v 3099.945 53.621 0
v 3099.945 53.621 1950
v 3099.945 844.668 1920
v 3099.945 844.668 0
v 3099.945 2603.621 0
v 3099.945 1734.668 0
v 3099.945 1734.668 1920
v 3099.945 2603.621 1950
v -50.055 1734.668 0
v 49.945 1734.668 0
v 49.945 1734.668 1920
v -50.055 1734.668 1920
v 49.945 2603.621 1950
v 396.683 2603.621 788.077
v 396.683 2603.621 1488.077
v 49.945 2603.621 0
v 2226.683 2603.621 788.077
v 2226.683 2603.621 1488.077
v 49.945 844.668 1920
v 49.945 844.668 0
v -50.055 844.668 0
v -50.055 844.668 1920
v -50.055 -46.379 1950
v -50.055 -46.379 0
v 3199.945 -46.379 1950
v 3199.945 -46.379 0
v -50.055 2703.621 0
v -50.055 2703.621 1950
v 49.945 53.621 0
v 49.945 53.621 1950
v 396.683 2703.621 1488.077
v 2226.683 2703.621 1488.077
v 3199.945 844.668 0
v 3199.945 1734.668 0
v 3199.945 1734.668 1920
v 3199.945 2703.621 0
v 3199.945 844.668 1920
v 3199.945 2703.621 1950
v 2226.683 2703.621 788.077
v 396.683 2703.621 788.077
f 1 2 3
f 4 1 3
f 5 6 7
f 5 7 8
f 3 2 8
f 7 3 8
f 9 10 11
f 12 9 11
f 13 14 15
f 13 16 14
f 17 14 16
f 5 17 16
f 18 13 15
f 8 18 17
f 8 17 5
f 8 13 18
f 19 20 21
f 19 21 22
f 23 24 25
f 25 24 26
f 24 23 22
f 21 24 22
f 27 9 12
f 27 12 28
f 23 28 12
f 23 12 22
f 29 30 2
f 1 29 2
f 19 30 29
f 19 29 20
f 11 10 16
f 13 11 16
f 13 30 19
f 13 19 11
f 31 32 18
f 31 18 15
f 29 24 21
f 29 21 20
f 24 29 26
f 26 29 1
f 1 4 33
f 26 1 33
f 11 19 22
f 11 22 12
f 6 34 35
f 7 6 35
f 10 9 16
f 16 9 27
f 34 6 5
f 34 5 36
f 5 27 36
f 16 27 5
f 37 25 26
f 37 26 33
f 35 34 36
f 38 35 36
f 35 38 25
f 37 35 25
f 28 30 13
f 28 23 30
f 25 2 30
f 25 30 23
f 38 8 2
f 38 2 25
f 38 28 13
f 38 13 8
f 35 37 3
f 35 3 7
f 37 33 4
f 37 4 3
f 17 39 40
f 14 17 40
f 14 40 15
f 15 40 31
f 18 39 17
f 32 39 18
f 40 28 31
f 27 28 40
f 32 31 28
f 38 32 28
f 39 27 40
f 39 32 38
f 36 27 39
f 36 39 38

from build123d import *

# Parameters (mm, degrees)
F0_W     = 3250
F0_H     = 2750
F1_DEPTH = 1950
F2_T     = -100
F3_DEPTH = 200
F4_W     = 890
F4_H     = 1920
F5_DEPTH = 4000
F7_W     = 1830
F7_H     = 700
F8_DEPTH = 200


with BuildPart() as f1:
    # F0 (on Top) → F1 (new body)
    with BuildSketch(Plane.XY):
        with Locations((1574.9453641474, 1328.6207094789)):
            Rectangle(F0_W, F0_H)
    extrude(amount=F1_DEPTH)

    # F2
    f2_openings = [f1.faces().sort_by_distance(p)[0] for p in [
        (1574.945364, 1328.620709, 1950),
    ]]
    offset(amount=F2_T, openings=f2_openings)

    # F3 (cut): a face of the model
    f3_faces = [f1.faces().sort_by_distance(p)[0] for p in [
        (1574.9453641474, 1328.6207094789, 100),
    ]]
    extrude(f3_faces, amount=-F3_DEPTH, mode=Mode.SUBTRACT)

    # F4 (on face) → F5 (cut)
    with BuildSketch(Plane.YZ.offset(3199.9453641474)):
        with Locations((1289.667673111, 960)):
            Rectangle(F4_W, F4_H)
    extrude(amount=-F5_DEPTH, mode=Mode.SUBTRACT)

    # F7 (on face) → F8 (cut)
    with BuildSketch(Plane(origin=(0, 2703.6207094789, 0), x_dir=(-1, 0, 0), z_dir=(0, 1, 0))):
        with Locations((-1311.6826629639, 1138.0767583847)):
            Rectangle(F7_W, F7_H)
    extrude(amount=-F8_DEPTH, mode=Mode.SUBTRACT)


solid = f1.part
